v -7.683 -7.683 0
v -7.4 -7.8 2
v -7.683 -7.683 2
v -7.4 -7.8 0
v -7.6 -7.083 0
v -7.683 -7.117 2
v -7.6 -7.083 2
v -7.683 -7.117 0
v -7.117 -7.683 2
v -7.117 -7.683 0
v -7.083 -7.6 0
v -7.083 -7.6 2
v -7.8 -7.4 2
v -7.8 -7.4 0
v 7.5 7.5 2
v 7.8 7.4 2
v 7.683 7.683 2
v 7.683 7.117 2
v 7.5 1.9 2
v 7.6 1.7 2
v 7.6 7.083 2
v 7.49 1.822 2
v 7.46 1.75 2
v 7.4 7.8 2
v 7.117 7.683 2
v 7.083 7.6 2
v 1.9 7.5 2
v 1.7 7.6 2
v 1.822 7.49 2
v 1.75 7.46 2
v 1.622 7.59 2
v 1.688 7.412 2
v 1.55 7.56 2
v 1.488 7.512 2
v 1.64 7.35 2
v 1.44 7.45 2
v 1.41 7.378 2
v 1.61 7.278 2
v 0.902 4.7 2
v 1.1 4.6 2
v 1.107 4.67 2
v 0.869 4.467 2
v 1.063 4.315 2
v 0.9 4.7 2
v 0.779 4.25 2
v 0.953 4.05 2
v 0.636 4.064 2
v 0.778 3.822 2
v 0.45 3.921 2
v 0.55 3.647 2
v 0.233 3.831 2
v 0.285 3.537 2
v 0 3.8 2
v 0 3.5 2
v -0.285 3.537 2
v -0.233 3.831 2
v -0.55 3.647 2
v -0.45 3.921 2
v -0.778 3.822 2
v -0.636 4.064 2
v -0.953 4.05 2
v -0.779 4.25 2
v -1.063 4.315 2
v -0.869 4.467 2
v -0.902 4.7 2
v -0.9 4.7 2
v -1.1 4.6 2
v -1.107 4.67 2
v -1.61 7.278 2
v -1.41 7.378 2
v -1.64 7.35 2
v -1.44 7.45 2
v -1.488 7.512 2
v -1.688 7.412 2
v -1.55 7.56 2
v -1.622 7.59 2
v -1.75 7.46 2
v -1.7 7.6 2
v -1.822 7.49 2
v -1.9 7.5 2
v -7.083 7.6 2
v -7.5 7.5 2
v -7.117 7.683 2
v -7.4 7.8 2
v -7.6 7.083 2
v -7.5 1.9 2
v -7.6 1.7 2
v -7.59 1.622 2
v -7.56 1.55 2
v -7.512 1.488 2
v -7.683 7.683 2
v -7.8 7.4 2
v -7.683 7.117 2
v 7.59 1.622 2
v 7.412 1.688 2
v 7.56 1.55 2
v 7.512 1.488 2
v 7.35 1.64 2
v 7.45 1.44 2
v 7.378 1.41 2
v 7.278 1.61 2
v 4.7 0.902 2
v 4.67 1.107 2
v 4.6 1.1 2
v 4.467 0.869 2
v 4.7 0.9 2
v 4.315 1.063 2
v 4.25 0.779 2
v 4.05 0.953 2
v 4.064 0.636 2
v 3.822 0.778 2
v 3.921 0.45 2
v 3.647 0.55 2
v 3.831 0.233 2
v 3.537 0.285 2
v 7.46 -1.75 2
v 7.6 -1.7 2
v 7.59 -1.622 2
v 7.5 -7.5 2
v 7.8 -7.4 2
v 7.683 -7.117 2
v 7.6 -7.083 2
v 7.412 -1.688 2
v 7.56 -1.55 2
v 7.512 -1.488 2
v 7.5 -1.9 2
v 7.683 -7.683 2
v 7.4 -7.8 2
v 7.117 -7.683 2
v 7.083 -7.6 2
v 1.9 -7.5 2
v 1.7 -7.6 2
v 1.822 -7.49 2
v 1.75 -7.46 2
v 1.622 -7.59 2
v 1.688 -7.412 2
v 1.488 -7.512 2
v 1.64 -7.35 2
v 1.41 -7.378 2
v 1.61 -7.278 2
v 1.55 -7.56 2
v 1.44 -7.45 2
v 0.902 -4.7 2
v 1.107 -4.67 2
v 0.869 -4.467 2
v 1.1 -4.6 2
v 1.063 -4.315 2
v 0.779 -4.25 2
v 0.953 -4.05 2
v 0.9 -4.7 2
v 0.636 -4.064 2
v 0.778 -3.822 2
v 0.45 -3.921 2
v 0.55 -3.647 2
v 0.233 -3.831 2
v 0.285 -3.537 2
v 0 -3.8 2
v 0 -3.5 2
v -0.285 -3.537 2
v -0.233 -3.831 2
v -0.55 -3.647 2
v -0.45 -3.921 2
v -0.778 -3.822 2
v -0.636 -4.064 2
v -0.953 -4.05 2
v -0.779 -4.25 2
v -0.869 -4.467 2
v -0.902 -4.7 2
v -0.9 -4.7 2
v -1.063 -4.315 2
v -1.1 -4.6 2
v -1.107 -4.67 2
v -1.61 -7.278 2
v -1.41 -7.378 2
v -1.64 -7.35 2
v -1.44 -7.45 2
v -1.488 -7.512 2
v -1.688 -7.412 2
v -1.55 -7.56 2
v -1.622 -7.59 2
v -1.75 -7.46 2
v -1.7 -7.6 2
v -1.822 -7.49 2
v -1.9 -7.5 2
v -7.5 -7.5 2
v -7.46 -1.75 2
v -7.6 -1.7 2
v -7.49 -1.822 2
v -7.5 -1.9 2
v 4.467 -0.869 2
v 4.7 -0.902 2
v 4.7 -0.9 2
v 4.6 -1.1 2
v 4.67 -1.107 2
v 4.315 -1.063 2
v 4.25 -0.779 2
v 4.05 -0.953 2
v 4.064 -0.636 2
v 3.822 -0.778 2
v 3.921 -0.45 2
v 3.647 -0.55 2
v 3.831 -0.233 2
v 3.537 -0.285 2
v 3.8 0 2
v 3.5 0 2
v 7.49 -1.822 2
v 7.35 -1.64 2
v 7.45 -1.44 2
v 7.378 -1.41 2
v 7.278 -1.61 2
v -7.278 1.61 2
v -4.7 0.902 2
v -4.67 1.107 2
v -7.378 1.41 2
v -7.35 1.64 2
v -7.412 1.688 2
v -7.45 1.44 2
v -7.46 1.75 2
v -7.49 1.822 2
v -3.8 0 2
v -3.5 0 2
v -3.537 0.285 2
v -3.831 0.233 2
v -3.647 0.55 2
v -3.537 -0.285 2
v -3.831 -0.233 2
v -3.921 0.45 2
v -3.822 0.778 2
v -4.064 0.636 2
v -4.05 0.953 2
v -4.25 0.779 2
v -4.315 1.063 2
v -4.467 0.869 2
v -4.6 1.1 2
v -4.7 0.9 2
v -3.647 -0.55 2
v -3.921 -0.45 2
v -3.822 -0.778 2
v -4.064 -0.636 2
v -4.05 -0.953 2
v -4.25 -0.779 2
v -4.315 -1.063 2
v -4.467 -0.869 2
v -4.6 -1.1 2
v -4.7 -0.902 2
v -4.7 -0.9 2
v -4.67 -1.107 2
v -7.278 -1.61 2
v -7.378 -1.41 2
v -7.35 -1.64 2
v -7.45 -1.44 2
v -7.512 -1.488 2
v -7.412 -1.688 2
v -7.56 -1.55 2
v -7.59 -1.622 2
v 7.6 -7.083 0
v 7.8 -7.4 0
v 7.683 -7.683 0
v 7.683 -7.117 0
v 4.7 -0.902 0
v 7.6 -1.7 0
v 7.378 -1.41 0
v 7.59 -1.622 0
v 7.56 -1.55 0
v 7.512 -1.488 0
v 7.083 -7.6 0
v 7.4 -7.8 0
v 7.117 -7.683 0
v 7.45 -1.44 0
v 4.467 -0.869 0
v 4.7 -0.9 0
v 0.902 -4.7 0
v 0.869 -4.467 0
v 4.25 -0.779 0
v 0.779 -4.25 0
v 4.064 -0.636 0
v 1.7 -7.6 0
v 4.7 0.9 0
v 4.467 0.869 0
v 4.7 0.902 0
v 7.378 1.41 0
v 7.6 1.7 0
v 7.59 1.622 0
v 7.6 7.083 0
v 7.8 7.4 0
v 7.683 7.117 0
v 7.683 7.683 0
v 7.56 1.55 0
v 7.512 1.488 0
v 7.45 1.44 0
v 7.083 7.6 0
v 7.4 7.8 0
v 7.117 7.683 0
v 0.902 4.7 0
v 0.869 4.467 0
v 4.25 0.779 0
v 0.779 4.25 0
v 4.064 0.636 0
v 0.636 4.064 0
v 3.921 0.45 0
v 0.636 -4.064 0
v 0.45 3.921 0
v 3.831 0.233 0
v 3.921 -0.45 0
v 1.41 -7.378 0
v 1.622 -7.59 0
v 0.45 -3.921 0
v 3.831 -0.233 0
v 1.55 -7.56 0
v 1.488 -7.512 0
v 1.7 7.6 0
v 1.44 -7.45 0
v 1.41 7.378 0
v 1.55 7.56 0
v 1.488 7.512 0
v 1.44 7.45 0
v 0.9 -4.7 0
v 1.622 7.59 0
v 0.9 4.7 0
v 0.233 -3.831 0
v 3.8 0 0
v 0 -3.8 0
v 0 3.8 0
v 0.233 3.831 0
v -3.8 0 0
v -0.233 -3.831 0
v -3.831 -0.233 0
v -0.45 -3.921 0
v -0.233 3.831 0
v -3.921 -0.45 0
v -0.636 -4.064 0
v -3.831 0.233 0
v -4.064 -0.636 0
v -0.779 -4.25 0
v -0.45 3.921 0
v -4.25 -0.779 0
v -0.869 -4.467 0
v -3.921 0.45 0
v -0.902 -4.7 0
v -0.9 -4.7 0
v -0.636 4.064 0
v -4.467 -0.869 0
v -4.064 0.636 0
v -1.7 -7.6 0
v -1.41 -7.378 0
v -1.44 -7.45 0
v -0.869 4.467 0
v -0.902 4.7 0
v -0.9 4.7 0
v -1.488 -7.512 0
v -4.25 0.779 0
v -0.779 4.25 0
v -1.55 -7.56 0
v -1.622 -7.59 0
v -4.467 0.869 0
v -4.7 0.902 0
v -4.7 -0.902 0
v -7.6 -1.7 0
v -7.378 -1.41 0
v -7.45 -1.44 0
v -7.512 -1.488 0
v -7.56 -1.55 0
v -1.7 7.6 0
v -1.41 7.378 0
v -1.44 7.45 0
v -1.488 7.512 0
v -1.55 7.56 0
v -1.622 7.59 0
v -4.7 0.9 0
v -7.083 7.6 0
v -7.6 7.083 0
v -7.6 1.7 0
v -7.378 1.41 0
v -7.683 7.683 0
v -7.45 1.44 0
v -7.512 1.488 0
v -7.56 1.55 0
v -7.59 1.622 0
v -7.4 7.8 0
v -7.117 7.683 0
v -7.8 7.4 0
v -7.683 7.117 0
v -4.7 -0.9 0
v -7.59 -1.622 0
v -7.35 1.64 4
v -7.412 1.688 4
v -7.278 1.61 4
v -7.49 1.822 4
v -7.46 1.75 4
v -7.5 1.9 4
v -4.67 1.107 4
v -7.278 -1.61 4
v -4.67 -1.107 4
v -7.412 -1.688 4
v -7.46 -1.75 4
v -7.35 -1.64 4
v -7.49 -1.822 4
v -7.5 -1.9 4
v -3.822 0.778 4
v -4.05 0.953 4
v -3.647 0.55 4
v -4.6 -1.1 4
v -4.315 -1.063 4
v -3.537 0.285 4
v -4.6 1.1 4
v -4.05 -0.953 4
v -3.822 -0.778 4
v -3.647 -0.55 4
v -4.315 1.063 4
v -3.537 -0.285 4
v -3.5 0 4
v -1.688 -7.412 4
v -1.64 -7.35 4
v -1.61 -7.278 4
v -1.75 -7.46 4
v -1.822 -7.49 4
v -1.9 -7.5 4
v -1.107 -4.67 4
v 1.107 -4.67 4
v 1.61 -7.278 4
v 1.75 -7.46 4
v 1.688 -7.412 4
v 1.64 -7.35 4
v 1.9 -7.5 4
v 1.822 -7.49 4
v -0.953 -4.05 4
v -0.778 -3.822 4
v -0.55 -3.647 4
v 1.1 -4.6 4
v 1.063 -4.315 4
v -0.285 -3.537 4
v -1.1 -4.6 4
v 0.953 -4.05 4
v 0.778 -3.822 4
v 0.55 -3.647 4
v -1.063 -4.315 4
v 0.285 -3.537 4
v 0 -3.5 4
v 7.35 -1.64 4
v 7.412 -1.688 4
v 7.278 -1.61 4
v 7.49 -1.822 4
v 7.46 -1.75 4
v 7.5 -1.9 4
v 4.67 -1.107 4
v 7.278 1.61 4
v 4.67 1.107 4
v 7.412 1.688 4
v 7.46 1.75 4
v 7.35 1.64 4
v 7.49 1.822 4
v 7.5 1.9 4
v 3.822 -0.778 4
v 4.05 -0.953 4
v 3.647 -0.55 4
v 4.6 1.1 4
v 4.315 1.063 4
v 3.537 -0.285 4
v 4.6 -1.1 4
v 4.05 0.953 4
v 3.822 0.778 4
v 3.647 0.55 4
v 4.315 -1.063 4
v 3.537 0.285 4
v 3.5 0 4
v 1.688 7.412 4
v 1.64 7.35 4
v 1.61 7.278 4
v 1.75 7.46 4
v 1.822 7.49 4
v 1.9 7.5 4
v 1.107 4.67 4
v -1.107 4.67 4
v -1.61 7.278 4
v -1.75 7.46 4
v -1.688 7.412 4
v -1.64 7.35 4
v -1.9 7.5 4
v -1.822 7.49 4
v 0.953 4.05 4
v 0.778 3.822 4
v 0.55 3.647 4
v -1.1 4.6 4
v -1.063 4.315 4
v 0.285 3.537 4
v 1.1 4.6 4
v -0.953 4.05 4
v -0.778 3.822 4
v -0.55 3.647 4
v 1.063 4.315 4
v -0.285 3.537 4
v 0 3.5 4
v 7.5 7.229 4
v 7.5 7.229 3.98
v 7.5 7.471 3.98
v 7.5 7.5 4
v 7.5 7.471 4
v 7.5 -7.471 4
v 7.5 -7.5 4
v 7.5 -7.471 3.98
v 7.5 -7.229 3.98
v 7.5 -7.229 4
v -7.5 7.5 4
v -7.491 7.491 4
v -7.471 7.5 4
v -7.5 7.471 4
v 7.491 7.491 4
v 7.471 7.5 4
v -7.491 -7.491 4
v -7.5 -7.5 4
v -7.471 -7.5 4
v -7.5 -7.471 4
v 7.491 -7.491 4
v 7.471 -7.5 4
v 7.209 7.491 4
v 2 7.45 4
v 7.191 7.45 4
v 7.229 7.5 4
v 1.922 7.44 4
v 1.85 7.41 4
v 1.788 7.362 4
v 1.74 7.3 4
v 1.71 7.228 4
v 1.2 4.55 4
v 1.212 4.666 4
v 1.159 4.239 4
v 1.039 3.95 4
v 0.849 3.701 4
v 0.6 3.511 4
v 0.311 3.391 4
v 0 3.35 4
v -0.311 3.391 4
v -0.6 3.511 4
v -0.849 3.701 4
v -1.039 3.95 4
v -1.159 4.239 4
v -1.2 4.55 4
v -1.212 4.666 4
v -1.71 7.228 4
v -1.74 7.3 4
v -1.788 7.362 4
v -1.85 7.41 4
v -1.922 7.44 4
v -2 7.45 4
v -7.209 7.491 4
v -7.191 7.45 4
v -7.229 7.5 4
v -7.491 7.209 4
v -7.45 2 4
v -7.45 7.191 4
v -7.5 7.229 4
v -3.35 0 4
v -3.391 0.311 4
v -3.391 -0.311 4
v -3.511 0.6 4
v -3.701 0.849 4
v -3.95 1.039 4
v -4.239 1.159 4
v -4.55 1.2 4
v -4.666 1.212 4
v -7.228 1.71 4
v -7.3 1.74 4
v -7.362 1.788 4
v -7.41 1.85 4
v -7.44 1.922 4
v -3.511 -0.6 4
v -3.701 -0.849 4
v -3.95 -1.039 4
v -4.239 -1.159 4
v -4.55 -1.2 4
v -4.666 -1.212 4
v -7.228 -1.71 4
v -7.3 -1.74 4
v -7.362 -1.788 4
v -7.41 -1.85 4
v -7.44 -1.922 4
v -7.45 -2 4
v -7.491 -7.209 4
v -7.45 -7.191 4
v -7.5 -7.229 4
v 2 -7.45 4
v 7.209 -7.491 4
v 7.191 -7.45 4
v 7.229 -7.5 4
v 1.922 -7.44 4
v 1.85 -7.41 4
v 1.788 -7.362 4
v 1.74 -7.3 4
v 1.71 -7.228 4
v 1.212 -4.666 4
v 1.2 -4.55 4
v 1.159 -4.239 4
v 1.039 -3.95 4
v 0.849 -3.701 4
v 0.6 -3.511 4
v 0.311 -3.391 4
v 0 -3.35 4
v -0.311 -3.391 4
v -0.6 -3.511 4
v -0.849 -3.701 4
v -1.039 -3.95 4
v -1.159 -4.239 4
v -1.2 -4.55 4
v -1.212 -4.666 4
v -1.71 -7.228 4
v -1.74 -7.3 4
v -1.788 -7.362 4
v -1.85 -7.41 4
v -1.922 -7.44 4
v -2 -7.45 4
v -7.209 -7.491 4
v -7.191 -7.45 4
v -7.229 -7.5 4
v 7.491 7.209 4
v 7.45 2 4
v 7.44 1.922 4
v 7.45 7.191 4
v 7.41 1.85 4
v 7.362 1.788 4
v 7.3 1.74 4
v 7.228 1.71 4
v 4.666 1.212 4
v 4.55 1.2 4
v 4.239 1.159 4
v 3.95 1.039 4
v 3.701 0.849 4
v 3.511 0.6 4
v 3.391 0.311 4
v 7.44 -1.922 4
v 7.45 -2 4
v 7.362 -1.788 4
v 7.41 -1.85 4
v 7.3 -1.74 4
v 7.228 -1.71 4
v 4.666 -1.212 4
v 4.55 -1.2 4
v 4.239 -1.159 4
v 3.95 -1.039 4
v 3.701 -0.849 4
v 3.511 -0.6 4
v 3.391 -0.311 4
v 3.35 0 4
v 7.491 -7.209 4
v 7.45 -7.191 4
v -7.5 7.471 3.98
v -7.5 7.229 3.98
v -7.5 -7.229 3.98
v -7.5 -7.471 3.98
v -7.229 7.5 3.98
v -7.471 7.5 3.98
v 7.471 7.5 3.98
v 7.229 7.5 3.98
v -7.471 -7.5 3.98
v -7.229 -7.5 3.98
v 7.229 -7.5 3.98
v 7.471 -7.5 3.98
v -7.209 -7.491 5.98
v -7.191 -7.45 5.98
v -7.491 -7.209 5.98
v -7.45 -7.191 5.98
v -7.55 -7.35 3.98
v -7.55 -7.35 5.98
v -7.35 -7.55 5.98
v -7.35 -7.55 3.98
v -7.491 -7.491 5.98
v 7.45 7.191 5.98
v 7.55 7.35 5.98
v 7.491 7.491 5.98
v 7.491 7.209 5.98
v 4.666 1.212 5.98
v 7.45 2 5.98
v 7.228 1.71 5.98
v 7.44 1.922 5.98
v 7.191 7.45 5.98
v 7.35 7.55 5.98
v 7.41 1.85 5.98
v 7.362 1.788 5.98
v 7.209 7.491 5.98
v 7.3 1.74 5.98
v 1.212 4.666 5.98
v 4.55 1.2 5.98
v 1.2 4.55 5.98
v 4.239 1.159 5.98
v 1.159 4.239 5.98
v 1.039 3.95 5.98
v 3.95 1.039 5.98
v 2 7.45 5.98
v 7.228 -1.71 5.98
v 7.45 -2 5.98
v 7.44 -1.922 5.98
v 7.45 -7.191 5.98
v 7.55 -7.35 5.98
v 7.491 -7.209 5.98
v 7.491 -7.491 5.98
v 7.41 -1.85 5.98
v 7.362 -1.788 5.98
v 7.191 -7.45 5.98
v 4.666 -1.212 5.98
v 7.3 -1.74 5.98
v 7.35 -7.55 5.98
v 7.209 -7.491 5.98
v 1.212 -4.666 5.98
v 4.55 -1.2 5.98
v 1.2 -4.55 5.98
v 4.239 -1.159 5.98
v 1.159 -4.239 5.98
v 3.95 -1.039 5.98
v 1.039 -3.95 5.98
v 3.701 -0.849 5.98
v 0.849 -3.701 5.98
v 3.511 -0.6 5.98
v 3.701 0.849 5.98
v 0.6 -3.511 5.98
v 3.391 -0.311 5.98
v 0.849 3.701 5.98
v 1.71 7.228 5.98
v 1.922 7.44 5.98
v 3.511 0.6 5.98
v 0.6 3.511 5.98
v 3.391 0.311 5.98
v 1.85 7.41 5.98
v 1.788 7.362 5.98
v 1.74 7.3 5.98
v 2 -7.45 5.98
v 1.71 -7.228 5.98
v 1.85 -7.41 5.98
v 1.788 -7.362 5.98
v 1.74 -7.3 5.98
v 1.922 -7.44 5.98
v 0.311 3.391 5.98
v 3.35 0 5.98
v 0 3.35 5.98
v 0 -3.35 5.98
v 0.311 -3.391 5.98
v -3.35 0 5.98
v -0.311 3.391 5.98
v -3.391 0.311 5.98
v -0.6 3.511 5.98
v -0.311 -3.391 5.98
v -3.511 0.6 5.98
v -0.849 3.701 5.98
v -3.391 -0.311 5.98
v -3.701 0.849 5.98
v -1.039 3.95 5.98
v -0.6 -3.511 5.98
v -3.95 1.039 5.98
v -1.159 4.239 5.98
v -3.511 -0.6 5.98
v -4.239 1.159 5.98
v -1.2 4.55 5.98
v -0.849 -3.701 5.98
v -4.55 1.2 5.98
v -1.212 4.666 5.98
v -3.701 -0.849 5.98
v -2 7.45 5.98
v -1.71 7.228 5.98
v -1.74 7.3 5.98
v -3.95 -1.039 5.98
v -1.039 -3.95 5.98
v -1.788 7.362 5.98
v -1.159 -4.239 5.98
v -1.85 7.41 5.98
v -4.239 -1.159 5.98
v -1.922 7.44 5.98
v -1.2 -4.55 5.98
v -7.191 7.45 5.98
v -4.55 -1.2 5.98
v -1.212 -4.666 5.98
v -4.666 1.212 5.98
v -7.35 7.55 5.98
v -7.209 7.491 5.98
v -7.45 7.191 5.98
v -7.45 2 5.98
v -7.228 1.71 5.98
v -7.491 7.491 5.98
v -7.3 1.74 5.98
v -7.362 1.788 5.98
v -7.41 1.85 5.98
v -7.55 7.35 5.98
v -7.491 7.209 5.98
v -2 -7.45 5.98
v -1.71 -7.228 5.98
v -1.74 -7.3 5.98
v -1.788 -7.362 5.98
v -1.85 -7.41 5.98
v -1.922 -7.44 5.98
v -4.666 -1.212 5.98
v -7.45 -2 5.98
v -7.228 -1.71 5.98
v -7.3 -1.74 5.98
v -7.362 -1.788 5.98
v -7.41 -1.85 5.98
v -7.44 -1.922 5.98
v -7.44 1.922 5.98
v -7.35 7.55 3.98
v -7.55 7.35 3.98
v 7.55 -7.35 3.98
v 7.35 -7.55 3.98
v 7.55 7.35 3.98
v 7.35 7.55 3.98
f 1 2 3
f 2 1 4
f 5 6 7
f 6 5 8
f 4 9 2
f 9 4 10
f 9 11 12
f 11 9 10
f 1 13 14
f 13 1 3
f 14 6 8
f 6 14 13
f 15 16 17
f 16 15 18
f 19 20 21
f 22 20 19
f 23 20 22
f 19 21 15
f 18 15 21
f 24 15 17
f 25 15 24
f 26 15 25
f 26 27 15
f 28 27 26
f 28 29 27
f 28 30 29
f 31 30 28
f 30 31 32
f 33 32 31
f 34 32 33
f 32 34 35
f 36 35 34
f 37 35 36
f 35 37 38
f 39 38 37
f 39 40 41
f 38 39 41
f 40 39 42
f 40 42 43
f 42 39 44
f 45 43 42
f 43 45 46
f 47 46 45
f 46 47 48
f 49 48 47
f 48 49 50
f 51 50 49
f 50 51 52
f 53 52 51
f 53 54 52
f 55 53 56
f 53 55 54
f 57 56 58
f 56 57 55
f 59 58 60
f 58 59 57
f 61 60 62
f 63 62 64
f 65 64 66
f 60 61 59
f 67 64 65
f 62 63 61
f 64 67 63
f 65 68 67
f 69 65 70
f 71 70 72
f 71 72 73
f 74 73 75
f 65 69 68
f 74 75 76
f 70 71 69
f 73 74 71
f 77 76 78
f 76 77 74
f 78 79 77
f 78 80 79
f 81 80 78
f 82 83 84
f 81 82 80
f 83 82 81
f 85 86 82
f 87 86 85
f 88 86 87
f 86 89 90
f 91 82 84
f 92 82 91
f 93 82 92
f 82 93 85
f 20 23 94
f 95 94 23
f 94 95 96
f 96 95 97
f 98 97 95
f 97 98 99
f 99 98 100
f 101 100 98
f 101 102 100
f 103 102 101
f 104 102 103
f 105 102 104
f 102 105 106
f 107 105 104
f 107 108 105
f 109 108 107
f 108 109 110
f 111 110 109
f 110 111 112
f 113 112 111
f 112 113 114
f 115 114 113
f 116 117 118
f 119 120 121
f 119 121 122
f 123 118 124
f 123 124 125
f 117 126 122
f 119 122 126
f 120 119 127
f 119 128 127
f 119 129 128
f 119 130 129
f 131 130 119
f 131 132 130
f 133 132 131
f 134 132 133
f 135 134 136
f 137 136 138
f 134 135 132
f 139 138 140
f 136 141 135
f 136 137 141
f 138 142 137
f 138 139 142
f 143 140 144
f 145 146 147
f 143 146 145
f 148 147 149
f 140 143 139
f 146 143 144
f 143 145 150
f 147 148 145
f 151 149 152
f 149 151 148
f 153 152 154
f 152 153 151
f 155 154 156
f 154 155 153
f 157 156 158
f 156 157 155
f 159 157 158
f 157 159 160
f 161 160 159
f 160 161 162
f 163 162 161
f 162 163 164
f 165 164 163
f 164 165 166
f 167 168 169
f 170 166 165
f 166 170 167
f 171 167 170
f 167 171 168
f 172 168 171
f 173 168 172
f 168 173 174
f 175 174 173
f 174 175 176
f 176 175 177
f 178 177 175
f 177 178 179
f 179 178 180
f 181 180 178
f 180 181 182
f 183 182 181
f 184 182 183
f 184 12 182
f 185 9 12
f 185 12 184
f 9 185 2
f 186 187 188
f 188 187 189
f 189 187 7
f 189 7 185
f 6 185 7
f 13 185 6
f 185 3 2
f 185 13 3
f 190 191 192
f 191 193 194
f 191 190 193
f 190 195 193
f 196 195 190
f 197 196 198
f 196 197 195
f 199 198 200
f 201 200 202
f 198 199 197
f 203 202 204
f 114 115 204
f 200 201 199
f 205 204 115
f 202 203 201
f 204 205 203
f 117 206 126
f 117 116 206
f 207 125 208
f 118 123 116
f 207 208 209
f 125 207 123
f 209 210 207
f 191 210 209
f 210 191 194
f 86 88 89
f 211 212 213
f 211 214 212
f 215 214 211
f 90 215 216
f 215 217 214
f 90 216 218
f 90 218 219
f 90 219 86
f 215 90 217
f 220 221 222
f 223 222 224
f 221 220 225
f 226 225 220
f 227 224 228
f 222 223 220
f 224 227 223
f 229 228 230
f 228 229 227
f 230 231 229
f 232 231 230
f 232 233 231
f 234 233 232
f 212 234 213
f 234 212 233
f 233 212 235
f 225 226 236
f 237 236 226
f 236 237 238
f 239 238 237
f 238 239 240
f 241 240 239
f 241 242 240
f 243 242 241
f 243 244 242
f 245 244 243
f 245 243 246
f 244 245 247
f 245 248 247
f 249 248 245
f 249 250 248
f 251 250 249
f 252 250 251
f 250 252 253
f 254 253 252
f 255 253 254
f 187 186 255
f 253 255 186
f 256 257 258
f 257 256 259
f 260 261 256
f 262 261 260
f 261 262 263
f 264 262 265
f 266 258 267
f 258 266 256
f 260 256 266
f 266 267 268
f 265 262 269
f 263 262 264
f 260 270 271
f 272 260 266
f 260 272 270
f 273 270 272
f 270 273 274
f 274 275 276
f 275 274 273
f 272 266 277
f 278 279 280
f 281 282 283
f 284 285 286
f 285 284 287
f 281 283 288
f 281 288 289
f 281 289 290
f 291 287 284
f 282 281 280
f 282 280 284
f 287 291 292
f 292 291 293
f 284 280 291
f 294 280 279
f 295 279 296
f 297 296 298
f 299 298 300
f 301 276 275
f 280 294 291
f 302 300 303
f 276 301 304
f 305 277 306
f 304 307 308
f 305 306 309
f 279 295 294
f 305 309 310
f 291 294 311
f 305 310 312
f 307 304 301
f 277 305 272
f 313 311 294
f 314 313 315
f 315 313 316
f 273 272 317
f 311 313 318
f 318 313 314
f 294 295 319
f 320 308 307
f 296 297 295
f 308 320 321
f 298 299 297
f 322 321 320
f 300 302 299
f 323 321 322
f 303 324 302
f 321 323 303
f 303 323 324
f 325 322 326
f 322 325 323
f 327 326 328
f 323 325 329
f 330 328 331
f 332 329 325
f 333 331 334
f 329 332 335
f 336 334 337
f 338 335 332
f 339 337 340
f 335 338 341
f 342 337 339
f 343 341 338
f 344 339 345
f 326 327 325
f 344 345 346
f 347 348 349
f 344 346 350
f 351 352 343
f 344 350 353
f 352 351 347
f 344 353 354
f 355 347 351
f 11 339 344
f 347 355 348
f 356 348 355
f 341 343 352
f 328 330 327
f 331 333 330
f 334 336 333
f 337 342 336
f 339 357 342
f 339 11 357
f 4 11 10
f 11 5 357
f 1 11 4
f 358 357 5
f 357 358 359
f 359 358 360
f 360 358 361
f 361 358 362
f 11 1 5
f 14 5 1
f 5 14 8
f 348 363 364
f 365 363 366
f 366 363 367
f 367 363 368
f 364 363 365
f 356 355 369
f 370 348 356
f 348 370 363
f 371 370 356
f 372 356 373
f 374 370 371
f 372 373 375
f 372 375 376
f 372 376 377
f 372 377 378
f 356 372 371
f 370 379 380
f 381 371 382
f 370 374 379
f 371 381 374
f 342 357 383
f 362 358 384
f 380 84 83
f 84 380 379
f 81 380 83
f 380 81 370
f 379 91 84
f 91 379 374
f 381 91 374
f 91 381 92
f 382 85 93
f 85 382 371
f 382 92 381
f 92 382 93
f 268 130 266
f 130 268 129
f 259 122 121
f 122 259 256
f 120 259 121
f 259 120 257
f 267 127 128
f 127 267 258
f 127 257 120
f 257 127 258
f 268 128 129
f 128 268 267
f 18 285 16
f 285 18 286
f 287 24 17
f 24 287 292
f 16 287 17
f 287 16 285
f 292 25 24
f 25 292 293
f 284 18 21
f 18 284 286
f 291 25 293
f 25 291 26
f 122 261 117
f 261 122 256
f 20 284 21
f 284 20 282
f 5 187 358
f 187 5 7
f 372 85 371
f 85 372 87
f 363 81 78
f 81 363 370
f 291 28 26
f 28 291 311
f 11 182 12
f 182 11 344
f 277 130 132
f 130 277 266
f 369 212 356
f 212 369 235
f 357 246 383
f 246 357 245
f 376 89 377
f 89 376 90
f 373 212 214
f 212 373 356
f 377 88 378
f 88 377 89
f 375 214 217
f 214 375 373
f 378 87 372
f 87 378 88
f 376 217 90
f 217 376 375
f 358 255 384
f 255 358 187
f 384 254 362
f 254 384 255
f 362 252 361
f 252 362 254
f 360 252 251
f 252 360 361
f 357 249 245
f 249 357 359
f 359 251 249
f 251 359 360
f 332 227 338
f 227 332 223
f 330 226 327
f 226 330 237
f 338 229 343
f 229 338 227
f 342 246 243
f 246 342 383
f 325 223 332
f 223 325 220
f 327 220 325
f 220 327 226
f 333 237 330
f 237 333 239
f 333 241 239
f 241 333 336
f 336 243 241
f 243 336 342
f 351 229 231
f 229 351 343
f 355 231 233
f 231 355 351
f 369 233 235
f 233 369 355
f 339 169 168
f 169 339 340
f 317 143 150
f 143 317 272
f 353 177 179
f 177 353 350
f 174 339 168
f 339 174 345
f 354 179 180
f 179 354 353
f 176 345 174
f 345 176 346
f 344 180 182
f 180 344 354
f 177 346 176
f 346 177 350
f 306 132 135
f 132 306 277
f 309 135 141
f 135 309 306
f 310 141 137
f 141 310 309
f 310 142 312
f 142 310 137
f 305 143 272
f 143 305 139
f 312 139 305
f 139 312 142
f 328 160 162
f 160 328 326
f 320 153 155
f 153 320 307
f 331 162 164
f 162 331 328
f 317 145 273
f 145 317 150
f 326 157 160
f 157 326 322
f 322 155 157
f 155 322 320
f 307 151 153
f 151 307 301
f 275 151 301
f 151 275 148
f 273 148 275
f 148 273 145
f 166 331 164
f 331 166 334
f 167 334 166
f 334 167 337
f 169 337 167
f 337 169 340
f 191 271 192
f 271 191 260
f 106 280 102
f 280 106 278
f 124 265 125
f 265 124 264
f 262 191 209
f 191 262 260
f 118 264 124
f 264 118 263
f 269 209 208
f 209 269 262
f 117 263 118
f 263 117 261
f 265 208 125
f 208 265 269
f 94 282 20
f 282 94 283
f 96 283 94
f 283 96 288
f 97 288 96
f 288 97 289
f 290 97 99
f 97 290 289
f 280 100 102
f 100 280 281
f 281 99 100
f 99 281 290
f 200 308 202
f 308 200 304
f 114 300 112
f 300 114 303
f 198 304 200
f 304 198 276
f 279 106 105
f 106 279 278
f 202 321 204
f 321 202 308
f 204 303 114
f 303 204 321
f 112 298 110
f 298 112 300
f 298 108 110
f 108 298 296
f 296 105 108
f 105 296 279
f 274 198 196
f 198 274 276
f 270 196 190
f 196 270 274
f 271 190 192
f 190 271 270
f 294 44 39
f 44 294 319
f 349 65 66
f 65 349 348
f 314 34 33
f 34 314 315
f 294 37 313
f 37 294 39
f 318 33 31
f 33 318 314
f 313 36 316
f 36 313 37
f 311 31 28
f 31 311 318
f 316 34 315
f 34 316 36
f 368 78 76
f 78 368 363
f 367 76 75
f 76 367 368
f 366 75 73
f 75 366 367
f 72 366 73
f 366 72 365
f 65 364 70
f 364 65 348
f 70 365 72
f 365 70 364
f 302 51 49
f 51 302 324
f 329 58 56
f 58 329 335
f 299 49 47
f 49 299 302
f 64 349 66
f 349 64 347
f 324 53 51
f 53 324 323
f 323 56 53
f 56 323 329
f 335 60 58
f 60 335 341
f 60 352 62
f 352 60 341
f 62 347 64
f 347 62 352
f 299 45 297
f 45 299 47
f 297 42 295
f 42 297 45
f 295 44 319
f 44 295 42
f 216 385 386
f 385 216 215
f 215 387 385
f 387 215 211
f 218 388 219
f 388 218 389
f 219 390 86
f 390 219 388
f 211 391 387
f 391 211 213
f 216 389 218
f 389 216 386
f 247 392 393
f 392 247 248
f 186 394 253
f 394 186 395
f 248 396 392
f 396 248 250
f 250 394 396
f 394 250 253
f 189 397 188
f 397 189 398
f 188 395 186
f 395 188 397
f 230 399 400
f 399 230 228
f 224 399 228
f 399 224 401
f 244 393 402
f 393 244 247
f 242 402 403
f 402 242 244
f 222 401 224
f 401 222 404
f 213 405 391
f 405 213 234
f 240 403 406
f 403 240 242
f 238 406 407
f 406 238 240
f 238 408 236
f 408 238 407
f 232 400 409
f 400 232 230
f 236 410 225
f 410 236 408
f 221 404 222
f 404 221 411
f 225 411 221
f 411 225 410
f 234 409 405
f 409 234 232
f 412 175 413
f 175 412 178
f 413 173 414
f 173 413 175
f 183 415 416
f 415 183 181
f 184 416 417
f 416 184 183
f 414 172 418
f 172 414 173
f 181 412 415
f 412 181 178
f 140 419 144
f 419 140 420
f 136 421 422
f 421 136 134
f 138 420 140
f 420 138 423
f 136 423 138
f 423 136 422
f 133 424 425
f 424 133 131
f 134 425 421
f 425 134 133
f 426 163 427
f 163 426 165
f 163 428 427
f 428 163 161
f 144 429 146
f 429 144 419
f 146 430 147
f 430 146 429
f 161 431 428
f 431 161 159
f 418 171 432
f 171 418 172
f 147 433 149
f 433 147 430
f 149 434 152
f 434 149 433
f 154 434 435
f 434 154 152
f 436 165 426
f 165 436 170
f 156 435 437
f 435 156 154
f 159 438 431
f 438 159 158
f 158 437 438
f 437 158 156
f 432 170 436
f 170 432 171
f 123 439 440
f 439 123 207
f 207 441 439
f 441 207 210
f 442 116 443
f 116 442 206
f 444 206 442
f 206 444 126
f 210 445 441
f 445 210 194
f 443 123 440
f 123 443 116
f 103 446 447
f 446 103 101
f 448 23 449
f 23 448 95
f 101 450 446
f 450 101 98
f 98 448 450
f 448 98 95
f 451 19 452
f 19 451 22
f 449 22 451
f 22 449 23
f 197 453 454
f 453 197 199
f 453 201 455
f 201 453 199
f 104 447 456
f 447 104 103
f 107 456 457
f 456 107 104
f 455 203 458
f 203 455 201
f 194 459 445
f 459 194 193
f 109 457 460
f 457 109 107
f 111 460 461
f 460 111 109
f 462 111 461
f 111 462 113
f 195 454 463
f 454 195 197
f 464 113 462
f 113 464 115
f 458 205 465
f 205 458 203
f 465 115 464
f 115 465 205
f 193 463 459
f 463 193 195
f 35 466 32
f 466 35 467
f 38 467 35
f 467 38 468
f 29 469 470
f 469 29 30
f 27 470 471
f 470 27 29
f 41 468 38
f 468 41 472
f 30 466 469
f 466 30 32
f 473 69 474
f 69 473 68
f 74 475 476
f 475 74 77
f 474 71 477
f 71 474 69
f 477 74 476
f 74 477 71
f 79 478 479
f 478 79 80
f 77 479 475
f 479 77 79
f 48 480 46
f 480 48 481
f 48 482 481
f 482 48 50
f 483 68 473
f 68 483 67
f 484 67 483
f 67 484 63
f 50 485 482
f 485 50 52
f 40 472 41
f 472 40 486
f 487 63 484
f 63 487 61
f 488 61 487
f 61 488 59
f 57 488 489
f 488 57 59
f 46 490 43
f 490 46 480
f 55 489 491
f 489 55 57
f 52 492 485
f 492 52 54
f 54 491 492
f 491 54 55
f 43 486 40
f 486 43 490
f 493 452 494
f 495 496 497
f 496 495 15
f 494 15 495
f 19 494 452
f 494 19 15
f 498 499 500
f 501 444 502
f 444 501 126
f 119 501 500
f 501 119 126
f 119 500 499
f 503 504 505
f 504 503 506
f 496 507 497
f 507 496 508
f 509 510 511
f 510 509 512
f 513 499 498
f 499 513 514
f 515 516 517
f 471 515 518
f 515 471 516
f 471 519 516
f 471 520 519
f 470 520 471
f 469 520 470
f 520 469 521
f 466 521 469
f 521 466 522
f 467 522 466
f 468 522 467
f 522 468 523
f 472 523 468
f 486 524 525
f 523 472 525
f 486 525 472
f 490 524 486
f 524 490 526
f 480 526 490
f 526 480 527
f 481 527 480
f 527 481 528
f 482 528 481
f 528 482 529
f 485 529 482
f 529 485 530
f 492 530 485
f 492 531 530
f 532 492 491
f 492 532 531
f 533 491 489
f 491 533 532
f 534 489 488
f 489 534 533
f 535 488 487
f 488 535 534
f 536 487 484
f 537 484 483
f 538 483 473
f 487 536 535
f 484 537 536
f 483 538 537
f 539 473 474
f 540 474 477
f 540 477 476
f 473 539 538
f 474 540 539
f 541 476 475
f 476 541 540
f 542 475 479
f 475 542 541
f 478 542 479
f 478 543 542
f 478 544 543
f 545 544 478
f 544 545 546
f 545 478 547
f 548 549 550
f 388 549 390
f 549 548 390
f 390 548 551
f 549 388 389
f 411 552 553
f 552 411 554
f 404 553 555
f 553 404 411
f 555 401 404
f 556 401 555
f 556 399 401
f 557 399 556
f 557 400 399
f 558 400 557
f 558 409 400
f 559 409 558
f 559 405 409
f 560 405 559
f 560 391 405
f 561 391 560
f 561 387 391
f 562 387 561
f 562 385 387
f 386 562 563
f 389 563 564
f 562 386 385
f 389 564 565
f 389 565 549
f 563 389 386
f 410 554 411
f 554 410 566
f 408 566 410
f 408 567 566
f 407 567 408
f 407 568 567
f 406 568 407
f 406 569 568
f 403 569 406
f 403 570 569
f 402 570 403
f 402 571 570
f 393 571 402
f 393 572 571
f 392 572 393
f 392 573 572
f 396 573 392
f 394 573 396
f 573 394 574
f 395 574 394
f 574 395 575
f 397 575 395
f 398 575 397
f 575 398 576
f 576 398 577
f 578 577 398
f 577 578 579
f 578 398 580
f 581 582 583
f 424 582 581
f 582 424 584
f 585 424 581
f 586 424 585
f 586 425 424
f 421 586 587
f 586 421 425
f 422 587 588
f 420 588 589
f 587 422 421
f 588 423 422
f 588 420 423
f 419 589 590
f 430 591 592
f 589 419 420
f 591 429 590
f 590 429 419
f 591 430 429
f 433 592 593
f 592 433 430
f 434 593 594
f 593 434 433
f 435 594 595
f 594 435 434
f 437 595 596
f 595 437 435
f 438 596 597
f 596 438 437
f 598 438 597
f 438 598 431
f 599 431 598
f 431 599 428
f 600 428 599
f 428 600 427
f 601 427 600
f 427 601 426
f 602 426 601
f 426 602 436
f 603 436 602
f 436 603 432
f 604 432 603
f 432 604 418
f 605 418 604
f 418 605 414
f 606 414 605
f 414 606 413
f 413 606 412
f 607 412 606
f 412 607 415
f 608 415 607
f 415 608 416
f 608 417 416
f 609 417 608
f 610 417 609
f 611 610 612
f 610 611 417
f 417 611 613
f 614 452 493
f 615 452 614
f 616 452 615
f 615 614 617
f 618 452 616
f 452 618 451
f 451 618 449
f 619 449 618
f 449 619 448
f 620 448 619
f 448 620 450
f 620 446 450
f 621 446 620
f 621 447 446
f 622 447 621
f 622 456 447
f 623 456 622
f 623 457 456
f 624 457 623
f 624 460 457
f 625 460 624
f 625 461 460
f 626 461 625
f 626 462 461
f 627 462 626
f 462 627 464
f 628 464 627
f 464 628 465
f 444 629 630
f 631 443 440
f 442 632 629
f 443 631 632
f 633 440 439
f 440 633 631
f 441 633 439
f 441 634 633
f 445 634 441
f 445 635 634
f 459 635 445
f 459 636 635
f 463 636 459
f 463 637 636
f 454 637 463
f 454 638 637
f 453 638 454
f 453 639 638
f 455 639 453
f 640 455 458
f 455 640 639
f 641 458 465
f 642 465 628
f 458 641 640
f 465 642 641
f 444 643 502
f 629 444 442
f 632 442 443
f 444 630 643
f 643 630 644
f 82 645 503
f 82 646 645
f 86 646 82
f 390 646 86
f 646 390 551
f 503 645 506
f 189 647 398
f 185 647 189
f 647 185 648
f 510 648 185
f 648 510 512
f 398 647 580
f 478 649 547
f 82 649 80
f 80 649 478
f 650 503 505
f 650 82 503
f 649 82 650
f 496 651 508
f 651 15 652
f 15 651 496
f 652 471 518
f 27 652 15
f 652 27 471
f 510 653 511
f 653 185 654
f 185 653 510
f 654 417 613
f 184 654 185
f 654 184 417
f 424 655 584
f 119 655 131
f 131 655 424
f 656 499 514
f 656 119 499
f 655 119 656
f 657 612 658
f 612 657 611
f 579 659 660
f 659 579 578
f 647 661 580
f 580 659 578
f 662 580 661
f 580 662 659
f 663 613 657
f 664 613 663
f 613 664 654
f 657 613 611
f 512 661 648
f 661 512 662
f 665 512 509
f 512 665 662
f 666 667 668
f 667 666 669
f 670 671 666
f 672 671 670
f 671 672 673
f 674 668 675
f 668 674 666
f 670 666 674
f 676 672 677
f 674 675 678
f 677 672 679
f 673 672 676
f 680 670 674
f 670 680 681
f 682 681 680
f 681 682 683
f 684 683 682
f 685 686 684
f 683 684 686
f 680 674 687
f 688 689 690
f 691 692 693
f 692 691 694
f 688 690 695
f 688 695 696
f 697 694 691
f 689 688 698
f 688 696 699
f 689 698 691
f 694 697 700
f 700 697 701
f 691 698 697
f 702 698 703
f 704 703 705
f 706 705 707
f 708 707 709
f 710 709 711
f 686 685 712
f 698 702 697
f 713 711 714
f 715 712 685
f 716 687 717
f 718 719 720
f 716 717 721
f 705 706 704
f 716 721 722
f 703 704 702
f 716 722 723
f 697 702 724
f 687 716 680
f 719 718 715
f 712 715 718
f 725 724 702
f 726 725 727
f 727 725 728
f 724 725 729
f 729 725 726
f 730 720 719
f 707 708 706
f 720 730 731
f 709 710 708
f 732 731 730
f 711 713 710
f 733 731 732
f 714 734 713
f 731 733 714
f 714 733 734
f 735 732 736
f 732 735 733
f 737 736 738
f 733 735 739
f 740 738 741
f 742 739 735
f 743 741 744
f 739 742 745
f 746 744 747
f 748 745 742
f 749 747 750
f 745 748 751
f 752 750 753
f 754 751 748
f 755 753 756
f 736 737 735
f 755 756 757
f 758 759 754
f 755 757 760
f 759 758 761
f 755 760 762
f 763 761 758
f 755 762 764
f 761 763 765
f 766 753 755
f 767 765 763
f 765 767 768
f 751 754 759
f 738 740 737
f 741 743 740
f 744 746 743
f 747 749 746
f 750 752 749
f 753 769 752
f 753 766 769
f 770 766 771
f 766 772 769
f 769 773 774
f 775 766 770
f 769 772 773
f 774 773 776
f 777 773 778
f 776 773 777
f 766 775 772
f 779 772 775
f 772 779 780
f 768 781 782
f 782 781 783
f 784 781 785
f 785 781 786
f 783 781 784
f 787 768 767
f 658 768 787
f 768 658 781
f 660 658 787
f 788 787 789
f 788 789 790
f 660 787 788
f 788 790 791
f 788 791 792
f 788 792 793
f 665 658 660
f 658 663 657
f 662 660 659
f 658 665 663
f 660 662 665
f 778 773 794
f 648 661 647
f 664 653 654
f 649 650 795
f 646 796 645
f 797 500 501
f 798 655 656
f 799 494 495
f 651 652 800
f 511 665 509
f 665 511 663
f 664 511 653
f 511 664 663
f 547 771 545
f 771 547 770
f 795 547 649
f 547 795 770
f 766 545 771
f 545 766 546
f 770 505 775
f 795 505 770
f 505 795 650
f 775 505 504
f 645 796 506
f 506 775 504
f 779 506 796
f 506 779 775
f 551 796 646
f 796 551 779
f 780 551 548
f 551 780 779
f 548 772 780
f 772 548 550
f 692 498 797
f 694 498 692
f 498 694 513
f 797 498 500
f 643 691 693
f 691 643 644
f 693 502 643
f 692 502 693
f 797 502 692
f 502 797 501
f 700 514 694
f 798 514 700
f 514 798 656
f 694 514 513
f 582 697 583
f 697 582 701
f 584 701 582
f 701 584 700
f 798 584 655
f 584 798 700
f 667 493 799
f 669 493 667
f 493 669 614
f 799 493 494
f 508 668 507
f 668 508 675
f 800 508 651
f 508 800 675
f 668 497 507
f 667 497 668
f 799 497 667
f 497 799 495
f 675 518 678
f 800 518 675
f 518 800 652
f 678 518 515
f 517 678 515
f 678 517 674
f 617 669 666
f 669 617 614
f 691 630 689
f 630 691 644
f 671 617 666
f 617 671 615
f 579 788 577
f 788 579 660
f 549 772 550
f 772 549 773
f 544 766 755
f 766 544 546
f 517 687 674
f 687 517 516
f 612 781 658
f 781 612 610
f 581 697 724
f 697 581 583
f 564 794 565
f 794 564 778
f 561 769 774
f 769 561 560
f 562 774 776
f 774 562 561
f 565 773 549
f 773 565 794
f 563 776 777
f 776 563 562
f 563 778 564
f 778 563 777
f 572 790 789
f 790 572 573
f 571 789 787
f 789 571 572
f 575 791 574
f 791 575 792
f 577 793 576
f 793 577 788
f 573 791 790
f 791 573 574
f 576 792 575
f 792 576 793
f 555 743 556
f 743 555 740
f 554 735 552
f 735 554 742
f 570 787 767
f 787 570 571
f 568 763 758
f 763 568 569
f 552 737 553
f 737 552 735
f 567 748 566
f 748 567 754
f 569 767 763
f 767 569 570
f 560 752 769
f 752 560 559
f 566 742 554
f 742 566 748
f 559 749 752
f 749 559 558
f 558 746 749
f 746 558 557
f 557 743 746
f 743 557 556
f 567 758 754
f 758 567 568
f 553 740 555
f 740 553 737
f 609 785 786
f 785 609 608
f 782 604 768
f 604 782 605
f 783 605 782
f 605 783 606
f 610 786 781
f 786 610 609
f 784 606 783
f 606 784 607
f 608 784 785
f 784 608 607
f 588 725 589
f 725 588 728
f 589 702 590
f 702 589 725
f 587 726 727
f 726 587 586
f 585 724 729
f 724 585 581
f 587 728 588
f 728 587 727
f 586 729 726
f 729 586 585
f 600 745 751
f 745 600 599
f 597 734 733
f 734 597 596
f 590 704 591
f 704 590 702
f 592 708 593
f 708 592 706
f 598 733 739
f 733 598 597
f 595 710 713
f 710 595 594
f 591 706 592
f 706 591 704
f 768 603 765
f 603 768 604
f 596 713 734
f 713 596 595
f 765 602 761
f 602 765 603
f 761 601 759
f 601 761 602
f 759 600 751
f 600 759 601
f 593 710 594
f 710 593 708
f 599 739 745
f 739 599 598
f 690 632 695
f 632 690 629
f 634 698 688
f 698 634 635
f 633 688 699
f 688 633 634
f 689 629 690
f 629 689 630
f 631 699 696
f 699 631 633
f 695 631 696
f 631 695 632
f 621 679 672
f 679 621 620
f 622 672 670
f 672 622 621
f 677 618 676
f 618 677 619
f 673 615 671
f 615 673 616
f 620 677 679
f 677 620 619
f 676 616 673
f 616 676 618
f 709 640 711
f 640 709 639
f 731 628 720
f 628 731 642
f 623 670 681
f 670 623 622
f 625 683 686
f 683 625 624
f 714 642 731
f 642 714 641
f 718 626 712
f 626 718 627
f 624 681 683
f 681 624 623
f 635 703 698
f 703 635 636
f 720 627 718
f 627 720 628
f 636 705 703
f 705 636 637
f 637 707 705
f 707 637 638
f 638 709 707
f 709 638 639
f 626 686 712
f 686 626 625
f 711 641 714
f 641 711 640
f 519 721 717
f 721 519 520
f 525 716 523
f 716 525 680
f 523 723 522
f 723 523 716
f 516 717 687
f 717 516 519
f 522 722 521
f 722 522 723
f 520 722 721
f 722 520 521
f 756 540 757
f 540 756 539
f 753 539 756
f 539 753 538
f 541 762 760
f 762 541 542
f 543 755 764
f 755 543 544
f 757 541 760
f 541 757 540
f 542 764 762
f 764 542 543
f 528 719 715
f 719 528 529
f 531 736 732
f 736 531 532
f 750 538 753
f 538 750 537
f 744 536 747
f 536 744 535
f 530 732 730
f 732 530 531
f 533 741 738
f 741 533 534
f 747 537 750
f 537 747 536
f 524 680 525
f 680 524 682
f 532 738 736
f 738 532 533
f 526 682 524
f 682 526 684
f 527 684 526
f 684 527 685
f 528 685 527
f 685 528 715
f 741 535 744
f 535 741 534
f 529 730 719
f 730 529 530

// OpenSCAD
module slotT1(w,rs,re,len) {
$fn=24;
  hull() {
    translate([-w/2+re,-rs-re,0]) cylinder(r=re,h=len);
    translate([   -1   , -8  ,0]) cube([1,8-rs+1.2,len]);
    translate([-w/2-0.5,-10  ,0]) cube([w/2,1,len]);
  }
}

// rs -- radius of slot (slot width/2)
// d  -- depth  of slot
module slotT(w,rs,d,len) {
re=0.3;
$fn=24;
  difference() {
    translate([-w/2-2,-9,0]) cube([w/2+2,18,len]);

    translate([0,0,-1]) difference() {
      union() {
        translate([-w/2+d-rs,-10,0]) cube([6,20,len+2]);
        mirror([0,1,0]) slotT1(w,rs,re,len+2);
                        slotT1(w,rs,re,len+2);
      }

      translate([-w/2, 0 ,-1]) hull() {
        translate([d-rs,0,0]) cylinder(r=rs-0.5,h=len+2);
        translate([0,-rs+.2,0]) cube([0.1,2*rs-.4,len+2]);
      }
    }
  }
}

module ext15(len,fuzz=0) {
w=15;

wz = w + fuzz;
w1 = wz-abs(fuzz)*2;
  difference() {
    union() {
      translate([0,0,len/2]) cube([wz,wz,len],center=true);
      if (abs(fuzz) > 0) { // extra room on corners, where slop can be a problem 
        for(i=[-1,1]) for(j=[-1,1])
          translate([i*w1/2,j*w1/2,0])
           cylinder(r=abs(fuzz)*2,h=len,$fn=8);
      }
    }

    translate([0,0,-1]) {
      for (a=[0,90,180,270]) {
        rotate([0,0,a])
          slotT(wz,3.2/2-fuzz,4.5-fuzz,len+2);
      }
    }
  }
}

ext15(2,0.2);
ext15(4);
translate([0,0,3.98]) ext15(2,-0.1);
